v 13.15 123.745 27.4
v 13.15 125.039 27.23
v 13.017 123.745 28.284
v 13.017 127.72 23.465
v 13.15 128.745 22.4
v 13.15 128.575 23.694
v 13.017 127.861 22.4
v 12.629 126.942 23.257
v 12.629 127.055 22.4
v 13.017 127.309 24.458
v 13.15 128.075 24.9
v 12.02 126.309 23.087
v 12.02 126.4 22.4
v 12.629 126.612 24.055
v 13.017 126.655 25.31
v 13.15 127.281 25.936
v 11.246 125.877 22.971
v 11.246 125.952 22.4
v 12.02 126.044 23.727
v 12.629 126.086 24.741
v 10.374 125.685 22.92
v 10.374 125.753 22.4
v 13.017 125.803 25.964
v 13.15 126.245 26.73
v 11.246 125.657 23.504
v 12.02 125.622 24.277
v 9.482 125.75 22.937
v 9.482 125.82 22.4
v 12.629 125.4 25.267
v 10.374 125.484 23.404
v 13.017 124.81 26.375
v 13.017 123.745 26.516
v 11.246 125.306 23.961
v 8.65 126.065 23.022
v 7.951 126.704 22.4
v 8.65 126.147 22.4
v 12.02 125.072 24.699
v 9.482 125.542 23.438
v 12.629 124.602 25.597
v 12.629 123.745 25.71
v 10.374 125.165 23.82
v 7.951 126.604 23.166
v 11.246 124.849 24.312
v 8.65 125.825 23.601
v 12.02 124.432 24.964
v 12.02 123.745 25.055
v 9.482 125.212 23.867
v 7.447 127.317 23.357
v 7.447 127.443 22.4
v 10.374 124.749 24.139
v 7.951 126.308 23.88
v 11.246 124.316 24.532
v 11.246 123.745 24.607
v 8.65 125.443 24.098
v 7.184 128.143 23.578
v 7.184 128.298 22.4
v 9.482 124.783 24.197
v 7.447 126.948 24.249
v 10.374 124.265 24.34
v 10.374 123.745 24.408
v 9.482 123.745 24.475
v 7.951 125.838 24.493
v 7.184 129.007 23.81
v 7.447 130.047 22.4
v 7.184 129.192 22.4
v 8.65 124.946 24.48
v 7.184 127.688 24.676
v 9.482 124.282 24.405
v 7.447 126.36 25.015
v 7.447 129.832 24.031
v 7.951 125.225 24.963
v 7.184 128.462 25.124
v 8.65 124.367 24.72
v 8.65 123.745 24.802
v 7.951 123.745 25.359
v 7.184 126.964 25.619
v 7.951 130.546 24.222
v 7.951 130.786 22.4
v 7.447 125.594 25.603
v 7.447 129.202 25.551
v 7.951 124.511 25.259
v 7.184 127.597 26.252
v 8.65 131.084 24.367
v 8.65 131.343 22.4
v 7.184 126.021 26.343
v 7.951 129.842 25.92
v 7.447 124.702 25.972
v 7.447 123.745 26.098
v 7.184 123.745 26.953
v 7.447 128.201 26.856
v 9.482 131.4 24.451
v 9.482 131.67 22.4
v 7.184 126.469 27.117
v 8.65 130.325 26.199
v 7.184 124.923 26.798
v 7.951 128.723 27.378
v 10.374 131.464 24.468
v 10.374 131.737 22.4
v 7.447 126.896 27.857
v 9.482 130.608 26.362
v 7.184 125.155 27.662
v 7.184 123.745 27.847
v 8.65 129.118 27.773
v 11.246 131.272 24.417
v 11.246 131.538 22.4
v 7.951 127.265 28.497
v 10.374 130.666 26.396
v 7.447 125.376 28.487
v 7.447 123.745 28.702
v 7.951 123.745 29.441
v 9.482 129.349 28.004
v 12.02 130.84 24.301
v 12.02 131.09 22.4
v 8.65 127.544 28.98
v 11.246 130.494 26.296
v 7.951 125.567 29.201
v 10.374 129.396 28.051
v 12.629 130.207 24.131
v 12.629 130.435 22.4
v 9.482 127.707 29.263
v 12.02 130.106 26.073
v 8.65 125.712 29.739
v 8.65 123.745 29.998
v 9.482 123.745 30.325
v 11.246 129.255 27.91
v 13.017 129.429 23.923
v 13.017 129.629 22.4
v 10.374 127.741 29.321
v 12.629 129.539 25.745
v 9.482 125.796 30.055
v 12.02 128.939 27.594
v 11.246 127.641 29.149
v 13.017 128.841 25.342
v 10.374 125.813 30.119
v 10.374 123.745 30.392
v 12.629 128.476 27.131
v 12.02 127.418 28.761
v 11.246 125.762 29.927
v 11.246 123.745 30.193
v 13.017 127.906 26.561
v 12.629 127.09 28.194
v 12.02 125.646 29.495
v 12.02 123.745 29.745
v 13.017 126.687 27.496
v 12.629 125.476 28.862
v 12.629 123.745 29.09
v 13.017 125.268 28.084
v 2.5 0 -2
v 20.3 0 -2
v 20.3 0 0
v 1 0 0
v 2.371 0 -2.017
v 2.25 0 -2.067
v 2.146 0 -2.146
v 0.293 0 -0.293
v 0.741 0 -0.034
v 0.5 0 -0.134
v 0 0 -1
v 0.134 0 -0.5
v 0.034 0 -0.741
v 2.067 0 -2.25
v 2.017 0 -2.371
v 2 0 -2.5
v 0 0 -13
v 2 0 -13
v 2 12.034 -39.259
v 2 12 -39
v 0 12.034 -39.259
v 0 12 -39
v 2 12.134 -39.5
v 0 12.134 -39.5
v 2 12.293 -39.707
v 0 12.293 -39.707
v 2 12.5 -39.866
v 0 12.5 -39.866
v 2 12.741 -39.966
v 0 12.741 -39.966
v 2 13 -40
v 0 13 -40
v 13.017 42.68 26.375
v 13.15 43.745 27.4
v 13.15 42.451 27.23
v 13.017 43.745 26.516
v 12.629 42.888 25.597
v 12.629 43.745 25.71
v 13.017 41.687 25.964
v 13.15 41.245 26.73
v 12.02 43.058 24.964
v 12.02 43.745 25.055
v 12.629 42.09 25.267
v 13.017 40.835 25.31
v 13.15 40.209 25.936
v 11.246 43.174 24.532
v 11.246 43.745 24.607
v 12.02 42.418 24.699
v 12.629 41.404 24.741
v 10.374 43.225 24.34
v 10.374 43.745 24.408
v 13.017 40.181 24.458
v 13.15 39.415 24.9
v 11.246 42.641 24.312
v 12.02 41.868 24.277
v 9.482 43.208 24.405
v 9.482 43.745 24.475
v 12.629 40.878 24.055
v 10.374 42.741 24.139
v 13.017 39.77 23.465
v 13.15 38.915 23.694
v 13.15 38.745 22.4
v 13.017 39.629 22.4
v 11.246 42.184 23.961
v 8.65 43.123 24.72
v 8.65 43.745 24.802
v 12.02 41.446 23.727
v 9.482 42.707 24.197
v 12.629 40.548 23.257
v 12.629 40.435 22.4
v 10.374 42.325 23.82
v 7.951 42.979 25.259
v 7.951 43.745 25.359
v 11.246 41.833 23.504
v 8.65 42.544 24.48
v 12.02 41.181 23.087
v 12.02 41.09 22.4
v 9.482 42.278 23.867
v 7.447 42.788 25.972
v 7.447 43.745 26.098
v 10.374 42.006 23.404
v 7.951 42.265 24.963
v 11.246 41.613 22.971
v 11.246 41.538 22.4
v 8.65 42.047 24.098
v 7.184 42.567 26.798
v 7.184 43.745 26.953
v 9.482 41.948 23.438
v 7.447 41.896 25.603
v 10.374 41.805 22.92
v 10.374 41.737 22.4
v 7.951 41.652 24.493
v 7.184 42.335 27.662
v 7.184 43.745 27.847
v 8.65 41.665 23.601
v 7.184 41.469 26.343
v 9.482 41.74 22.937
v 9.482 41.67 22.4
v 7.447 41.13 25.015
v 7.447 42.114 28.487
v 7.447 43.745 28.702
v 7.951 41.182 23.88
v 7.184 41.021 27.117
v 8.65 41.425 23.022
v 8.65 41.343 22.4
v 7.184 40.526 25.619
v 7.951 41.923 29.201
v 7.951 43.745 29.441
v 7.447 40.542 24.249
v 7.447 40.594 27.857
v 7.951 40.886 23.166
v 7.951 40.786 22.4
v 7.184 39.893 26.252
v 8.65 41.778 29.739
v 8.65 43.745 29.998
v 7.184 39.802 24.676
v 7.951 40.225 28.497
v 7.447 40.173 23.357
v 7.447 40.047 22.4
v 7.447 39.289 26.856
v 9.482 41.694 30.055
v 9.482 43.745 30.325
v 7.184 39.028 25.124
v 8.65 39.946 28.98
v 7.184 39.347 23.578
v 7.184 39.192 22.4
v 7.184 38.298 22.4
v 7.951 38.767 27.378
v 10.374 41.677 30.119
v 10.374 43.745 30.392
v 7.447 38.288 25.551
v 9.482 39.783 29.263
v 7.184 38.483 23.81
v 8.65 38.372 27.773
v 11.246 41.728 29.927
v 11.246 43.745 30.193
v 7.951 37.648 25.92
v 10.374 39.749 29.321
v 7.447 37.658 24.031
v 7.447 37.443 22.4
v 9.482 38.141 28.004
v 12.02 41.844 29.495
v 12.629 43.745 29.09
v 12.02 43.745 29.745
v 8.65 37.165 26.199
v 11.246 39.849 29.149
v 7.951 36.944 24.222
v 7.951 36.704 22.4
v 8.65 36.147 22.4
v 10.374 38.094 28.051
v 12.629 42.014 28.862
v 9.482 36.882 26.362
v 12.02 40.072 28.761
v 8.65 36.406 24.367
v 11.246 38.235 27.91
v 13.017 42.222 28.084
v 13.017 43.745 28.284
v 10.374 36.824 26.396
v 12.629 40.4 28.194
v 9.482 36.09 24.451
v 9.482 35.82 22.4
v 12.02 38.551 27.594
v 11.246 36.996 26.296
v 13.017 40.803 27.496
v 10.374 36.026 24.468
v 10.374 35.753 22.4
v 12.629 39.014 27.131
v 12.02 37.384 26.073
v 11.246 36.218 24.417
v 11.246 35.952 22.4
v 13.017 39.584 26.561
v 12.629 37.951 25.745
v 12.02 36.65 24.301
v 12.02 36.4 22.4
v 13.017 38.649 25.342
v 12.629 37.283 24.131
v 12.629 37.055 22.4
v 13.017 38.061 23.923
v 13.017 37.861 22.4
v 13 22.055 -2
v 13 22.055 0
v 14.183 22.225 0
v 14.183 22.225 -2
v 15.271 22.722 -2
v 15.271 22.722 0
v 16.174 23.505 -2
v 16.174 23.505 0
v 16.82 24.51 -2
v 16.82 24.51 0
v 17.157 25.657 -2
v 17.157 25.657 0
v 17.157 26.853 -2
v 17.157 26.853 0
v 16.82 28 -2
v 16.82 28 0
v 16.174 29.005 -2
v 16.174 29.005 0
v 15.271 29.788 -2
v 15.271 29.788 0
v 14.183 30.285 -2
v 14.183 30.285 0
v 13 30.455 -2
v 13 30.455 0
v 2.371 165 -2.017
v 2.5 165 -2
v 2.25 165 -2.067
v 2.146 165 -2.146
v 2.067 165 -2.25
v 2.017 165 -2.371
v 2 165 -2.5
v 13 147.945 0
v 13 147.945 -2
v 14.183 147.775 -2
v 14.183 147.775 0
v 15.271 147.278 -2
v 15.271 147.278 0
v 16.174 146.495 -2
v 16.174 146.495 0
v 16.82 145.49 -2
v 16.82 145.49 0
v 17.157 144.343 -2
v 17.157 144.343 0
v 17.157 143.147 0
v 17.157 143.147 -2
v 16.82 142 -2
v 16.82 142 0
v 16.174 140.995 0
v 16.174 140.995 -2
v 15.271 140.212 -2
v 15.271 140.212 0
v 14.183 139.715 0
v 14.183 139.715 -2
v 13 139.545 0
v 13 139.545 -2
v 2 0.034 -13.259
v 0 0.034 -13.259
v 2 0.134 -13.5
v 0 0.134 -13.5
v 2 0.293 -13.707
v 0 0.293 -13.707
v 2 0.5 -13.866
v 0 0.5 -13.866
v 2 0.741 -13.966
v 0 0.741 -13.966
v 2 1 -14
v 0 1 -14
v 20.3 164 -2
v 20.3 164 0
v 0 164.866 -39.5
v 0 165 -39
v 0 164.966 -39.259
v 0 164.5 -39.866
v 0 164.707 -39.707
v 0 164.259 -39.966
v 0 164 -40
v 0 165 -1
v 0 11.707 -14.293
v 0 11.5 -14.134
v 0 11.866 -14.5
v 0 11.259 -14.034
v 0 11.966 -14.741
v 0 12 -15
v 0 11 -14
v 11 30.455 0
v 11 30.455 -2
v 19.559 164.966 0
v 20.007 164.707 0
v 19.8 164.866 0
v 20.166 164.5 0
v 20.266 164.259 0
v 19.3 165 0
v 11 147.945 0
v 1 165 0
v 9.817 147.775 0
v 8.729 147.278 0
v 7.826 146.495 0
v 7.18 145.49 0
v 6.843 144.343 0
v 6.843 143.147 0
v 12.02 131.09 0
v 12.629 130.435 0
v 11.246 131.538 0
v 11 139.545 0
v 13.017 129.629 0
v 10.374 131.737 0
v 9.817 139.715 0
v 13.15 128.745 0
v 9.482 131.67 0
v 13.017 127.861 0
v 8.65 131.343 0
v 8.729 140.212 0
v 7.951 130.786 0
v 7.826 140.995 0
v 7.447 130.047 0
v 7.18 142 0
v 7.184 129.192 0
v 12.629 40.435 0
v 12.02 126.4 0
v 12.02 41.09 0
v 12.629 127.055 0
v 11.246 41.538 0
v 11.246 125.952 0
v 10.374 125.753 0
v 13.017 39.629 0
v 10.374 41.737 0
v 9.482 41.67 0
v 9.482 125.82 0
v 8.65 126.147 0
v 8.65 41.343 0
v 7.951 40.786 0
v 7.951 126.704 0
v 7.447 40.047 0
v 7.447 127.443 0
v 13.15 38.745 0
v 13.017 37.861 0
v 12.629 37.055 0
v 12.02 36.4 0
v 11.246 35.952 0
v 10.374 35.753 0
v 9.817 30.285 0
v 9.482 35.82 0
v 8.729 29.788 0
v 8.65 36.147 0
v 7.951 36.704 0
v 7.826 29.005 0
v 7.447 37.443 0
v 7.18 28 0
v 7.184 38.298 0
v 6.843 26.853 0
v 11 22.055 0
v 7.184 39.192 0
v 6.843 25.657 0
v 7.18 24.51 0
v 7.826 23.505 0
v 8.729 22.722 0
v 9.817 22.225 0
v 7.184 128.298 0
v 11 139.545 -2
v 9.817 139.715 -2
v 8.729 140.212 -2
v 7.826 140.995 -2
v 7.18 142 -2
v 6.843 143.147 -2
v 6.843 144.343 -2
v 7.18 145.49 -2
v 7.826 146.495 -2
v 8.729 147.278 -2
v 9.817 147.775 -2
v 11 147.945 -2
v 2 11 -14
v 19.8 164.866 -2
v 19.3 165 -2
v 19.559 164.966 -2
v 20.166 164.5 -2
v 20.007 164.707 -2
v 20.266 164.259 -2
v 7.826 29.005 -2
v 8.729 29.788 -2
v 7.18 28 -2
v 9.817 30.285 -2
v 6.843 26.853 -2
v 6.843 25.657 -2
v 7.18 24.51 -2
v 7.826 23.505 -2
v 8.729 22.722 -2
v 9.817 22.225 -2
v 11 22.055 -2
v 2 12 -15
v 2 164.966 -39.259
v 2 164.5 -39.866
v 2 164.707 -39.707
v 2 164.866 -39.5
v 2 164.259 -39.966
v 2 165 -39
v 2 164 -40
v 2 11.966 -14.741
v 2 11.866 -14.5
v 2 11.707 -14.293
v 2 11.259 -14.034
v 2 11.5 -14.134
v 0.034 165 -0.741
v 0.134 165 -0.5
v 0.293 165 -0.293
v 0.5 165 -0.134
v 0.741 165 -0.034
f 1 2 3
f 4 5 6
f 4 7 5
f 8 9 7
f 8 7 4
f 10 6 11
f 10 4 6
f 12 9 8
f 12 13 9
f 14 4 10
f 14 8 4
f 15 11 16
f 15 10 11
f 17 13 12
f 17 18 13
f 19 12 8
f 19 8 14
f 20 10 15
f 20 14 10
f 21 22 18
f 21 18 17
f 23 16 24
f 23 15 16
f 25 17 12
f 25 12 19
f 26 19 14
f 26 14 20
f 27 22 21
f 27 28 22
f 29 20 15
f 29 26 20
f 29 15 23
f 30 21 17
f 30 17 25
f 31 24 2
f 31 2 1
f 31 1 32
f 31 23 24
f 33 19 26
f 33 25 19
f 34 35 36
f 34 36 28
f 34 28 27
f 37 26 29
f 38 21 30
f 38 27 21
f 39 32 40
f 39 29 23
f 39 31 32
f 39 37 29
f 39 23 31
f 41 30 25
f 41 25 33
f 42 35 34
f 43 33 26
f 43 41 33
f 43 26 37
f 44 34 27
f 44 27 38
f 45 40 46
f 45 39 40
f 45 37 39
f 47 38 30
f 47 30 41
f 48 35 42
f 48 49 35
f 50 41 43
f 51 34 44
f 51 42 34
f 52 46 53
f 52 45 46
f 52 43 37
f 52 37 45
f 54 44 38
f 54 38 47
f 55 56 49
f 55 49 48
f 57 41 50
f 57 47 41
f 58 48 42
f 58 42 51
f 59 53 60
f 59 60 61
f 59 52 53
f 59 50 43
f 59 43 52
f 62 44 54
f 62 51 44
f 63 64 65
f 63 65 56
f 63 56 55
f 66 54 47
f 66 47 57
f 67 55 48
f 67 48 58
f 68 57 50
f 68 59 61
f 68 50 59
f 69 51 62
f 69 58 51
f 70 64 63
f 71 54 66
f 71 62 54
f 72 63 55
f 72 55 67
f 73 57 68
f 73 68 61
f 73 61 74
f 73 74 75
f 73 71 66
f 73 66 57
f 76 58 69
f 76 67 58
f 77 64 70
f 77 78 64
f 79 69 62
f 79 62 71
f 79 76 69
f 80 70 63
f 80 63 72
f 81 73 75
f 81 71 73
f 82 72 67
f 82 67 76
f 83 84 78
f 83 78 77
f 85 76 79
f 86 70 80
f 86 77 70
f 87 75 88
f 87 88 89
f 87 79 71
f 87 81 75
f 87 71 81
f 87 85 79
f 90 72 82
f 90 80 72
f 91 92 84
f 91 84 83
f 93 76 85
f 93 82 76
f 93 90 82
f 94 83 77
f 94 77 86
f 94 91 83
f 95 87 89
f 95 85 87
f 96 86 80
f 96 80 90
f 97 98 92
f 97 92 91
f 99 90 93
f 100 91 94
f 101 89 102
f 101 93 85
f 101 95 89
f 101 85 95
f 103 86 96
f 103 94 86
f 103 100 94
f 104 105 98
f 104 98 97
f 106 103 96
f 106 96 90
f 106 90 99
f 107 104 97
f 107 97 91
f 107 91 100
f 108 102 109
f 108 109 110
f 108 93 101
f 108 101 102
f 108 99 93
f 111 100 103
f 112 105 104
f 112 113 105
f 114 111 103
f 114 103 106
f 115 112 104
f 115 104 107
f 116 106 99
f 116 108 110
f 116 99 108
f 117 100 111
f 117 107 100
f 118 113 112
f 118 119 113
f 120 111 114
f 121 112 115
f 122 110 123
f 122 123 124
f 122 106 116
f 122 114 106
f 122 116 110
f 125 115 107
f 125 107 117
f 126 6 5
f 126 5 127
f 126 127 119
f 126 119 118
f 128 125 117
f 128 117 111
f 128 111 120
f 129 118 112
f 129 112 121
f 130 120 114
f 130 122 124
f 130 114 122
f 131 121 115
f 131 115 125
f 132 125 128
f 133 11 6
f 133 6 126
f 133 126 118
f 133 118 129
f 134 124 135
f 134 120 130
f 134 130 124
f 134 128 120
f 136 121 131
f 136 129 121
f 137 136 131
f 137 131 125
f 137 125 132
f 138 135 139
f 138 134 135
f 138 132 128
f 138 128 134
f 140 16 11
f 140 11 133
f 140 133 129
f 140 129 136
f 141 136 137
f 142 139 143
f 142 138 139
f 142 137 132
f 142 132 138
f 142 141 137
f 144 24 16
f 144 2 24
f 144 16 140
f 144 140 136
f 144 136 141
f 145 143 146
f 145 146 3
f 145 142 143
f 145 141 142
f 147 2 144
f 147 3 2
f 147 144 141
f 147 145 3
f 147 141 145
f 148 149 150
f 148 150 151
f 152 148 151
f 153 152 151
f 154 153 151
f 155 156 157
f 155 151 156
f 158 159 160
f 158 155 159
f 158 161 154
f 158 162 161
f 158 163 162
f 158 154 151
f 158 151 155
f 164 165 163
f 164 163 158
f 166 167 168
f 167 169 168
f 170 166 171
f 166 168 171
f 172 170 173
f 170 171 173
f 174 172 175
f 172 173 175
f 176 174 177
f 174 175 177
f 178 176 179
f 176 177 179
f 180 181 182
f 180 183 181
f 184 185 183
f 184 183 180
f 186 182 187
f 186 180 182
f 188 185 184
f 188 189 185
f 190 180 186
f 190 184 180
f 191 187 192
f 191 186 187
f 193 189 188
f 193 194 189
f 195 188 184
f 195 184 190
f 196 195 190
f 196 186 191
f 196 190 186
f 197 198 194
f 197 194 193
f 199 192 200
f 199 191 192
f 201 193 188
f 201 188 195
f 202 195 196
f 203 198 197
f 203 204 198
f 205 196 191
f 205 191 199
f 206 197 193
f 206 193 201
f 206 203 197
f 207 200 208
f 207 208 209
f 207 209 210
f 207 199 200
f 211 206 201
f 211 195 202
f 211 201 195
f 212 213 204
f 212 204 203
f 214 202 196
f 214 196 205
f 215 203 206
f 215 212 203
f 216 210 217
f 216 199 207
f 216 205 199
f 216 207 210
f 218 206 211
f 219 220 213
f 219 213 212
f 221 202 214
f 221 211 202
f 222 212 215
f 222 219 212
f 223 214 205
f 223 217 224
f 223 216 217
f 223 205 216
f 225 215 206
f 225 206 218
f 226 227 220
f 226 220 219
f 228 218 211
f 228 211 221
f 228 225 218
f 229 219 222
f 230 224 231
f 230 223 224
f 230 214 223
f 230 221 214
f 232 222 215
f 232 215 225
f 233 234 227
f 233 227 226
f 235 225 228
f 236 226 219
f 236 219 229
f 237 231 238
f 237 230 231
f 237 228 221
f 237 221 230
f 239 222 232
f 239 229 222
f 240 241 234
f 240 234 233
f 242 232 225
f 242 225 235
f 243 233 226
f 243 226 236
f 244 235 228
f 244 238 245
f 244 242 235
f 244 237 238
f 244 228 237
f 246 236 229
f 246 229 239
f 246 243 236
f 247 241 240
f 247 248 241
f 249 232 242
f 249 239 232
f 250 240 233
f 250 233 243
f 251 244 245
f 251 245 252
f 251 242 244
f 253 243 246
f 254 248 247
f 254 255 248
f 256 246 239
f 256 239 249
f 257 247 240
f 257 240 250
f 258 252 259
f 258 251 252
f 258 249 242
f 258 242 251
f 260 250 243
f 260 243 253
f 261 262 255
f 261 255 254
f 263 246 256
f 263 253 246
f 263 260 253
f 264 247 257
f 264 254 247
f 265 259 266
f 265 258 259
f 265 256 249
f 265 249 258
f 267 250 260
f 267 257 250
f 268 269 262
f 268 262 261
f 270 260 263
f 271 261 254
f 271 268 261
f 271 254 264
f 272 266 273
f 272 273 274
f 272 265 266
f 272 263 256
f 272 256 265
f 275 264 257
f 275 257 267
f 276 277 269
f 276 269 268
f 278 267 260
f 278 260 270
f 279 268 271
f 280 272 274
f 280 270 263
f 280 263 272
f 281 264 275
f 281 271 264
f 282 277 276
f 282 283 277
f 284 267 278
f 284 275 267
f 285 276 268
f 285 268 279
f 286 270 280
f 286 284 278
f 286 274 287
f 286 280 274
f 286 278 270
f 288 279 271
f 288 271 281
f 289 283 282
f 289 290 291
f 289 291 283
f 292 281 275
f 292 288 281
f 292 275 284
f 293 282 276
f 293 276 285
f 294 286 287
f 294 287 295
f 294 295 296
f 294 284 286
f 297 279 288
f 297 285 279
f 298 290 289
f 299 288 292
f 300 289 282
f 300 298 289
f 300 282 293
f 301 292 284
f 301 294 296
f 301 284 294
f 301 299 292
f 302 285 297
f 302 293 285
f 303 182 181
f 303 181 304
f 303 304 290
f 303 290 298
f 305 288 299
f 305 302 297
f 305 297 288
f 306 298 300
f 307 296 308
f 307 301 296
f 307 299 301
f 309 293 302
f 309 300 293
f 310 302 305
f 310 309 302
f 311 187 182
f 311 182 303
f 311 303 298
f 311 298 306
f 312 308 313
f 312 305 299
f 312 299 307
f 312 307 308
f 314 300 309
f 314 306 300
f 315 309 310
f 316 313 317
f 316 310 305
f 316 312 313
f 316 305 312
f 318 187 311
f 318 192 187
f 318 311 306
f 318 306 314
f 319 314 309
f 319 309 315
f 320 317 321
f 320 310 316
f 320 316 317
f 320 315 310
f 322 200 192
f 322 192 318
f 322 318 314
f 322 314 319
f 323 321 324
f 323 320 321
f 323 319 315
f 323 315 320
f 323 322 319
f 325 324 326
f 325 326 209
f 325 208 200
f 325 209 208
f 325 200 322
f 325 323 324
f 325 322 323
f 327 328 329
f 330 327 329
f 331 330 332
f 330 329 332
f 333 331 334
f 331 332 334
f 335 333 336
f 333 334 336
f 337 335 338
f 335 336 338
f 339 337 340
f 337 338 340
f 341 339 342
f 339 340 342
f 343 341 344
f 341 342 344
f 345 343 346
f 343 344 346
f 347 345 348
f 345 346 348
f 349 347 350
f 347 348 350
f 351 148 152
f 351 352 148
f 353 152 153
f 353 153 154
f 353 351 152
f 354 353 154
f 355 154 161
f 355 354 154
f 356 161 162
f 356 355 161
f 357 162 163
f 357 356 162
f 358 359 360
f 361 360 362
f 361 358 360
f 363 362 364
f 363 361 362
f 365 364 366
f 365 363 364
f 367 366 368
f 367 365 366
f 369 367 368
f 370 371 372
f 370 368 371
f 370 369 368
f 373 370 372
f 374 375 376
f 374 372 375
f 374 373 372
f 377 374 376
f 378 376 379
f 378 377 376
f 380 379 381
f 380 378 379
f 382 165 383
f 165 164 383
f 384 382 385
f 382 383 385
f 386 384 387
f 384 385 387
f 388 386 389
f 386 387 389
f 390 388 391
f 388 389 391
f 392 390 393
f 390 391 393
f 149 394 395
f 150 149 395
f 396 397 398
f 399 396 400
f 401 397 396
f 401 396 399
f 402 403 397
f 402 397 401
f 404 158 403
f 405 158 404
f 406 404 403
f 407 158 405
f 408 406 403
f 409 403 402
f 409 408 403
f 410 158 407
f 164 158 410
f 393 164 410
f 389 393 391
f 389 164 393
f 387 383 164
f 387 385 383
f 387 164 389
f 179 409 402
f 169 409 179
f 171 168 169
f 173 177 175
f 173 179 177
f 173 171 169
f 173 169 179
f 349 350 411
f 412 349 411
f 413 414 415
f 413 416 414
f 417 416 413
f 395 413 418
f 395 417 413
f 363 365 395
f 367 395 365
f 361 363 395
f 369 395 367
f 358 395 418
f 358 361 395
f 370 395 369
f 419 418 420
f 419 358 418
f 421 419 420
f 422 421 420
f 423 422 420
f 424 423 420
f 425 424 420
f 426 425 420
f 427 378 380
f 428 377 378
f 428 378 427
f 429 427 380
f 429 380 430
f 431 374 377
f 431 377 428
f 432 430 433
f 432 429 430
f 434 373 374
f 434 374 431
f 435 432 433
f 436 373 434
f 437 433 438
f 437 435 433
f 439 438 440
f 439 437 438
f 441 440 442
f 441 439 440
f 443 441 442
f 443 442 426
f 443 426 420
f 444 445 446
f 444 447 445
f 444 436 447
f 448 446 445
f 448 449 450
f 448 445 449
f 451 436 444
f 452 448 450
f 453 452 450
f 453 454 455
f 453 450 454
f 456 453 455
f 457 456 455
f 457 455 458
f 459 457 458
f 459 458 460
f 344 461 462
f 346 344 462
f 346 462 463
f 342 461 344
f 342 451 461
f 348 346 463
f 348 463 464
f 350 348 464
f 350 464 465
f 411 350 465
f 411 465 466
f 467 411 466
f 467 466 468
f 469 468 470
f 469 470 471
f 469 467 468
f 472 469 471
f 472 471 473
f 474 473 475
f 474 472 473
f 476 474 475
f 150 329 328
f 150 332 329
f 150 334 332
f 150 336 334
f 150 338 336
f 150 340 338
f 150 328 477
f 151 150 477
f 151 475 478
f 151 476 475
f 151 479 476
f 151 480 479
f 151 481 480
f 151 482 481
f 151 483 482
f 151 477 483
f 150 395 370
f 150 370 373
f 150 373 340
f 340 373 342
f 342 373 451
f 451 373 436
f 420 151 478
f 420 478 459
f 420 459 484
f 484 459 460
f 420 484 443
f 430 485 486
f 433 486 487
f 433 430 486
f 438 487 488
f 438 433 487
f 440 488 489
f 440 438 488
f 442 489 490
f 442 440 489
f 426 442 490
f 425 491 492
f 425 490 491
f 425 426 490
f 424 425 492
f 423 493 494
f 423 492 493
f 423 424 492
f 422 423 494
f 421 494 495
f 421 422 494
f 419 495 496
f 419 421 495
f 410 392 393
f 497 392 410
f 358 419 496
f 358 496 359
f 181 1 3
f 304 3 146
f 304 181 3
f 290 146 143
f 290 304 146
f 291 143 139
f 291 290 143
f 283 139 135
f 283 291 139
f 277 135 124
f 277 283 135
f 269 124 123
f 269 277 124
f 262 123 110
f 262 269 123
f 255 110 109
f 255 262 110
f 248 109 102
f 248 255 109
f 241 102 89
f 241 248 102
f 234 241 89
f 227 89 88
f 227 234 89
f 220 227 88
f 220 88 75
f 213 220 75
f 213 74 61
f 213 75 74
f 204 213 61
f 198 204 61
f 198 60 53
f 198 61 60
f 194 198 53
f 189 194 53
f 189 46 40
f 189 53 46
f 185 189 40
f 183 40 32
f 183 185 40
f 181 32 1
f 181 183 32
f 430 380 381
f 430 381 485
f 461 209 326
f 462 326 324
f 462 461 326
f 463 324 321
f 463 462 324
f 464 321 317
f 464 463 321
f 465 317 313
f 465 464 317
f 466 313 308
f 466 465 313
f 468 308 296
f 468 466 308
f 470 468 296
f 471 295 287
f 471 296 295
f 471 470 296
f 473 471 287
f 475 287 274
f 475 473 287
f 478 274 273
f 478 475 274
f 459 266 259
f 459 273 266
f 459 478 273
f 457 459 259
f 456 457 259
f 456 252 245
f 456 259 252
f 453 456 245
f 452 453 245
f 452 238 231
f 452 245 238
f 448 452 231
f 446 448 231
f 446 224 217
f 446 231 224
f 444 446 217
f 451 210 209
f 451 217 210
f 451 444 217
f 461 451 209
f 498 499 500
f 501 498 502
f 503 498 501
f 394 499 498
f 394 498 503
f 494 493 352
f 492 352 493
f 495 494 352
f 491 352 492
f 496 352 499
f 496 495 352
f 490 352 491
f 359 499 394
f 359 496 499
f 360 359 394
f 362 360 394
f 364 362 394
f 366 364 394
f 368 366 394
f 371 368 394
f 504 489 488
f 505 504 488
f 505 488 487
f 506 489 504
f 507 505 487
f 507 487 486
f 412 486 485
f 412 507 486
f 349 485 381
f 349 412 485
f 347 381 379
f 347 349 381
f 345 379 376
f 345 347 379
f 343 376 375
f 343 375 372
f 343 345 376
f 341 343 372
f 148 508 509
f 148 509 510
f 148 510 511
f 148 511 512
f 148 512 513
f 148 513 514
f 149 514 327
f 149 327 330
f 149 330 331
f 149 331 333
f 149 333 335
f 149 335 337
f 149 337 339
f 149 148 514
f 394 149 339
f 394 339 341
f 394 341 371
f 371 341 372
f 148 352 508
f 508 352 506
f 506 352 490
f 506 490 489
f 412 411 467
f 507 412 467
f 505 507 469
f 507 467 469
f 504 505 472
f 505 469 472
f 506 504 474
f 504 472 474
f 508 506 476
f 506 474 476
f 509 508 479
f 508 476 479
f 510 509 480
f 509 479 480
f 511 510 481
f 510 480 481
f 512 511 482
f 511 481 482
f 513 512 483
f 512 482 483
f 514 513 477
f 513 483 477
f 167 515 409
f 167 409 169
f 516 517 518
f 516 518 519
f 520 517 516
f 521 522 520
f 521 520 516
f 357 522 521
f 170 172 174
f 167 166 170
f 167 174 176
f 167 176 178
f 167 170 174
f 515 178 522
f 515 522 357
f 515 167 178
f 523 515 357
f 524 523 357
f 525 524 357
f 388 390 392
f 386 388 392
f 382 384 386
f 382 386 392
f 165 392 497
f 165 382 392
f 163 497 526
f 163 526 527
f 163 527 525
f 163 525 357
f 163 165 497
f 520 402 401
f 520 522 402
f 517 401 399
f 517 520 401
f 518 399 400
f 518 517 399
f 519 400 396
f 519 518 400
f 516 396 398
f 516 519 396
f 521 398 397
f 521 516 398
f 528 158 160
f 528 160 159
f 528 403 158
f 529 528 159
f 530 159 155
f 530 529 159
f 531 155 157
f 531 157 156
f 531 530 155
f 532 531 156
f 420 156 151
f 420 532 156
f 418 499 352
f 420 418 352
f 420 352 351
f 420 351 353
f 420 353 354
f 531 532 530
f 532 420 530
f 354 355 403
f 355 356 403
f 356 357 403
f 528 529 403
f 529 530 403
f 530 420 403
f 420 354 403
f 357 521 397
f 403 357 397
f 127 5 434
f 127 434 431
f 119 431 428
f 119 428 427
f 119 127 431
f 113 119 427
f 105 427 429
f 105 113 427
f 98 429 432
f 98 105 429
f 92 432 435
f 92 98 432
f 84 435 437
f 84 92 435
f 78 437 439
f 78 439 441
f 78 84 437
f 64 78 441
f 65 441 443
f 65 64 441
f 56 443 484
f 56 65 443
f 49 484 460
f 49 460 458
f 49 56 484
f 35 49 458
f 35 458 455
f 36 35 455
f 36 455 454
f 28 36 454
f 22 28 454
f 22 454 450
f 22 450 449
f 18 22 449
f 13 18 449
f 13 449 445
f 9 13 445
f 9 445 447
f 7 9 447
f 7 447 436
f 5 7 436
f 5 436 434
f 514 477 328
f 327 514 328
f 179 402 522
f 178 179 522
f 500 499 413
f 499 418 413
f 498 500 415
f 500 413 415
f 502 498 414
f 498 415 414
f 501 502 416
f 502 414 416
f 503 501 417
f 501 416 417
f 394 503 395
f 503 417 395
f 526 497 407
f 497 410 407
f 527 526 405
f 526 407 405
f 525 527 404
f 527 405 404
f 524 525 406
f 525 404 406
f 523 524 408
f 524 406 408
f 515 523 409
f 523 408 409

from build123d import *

# Parameters (mm, degrees)
BOSS_EXTRUDE1_DEPTH = 165
CUT_EXTRUDE1_DEPTH  = 132
SKETCH5_R           = 3
SKETCH6_W           = 26
SKETCH6_H           = 12
CUT_EXTRUDE2_DEPTH  = 132
FILLET1_R           = 1
FILLET2_R           = 0.5


with BuildPart() as part:
    # Sketch1 → Boss-Extrude1 (new body)
    with BuildSketch(Plane(origin=(0, 0, 0), x_dir=(1, 0, 0), z_dir=(0, 1, 0))):
        Polygon((0, 0), (0, 40), (2, 40), (2, 2), (20.3, 2), (20.3, 0), align=None)
    extrude(amount=BOSS_EXTRUDE1_DEPTH)

    # Sketch2 → Cut-Extrude1 (cut)
    with BuildSketch(Plane.XY):
        with BuildLine():
            Line((13, 139.545), (11, 139.545))
            ThreePointArc((11, 139.545), (6.8, 143.745), (11, 147.945))
            Line((11, 147.945), (13, 147.945))
            ThreePointArc((13, 147.945), (17.2, 143.745), (13, 139.545))
        make_face()
        with BuildLine():
            Line((13, 30.455), (11, 30.455))
            ThreePointArc((11, 30.455), (6.8, 26.255), (11, 22.055))
            Line((11, 22.055), (13, 22.055))
            ThreePointArc((13, 22.055), (17.2, 26.255), (13, 30.455))
        make_face()
    extrude(amount=-CUT_EXTRUDE1_DEPTH, mode=Mode.SUBTRACT)

    # Sweep1: sweep along a path in Sketch4
    with BuildLine(Plane(origin=(10.15, 0, 0), x_dir=(0, 0, -1), z_dir=(1, 0, 0))) as sweep1_path:
        Line((0, 128.745), (-22.4, 128.745))
        ThreePointArc((-22.4, 128.745), (-25.935533906, 127.280533906), (-27.4, 123.745))
        Line((-27.4, 123.745), (-27.4, 43.745))
        ThreePointArc((-27.4, 43.745), (-25.935533906, 40.209466094), (-22.4, 38.745))
        Line((-22.4, 38.745), (0, 38.745))
    # Sketch5 → Sweep1 (sweep)
    with BuildSketch(Plane.XY):
        with Locations((10.15, 128.745)):
            Circle(SKETCH5_R)
    sweep(path=sweep1_path.line)

    # Sketch6 → Cut-Extrude2 (cut)
    with BuildSketch(Plane(origin=(2, 0, 0), x_dir=(0, 0, -1), z_dir=(1, 0, 0))):
        with Locations((27, 6)):
            Rectangle(SKETCH6_W, SKETCH6_H)
    extrude(amount=-CUT_EXTRUDE2_DEPTH, mode=Mode.SUBTRACT)

    # Fillet1
    fillet1_edges = [part.edges().sort_by_distance(p)[0] for p in [
        (0, 82.5, 0),
        (1, 165, -40),
        (1, 0, -14),
        (20.3, 165, -1),
        (1, 12, -14),
        (1, 12, -40),
    ]]
    fillet(fillet1_edges, radius=FILLET1_R)

    # Fillet2
    fillet2_edges = [part.edges().sort_by_distance(p)[0] for p in [
        (2, 82.5, -2),
    ]]
    fillet(fillet2_edges, radius=FILLET2_R)


solid = part.part
